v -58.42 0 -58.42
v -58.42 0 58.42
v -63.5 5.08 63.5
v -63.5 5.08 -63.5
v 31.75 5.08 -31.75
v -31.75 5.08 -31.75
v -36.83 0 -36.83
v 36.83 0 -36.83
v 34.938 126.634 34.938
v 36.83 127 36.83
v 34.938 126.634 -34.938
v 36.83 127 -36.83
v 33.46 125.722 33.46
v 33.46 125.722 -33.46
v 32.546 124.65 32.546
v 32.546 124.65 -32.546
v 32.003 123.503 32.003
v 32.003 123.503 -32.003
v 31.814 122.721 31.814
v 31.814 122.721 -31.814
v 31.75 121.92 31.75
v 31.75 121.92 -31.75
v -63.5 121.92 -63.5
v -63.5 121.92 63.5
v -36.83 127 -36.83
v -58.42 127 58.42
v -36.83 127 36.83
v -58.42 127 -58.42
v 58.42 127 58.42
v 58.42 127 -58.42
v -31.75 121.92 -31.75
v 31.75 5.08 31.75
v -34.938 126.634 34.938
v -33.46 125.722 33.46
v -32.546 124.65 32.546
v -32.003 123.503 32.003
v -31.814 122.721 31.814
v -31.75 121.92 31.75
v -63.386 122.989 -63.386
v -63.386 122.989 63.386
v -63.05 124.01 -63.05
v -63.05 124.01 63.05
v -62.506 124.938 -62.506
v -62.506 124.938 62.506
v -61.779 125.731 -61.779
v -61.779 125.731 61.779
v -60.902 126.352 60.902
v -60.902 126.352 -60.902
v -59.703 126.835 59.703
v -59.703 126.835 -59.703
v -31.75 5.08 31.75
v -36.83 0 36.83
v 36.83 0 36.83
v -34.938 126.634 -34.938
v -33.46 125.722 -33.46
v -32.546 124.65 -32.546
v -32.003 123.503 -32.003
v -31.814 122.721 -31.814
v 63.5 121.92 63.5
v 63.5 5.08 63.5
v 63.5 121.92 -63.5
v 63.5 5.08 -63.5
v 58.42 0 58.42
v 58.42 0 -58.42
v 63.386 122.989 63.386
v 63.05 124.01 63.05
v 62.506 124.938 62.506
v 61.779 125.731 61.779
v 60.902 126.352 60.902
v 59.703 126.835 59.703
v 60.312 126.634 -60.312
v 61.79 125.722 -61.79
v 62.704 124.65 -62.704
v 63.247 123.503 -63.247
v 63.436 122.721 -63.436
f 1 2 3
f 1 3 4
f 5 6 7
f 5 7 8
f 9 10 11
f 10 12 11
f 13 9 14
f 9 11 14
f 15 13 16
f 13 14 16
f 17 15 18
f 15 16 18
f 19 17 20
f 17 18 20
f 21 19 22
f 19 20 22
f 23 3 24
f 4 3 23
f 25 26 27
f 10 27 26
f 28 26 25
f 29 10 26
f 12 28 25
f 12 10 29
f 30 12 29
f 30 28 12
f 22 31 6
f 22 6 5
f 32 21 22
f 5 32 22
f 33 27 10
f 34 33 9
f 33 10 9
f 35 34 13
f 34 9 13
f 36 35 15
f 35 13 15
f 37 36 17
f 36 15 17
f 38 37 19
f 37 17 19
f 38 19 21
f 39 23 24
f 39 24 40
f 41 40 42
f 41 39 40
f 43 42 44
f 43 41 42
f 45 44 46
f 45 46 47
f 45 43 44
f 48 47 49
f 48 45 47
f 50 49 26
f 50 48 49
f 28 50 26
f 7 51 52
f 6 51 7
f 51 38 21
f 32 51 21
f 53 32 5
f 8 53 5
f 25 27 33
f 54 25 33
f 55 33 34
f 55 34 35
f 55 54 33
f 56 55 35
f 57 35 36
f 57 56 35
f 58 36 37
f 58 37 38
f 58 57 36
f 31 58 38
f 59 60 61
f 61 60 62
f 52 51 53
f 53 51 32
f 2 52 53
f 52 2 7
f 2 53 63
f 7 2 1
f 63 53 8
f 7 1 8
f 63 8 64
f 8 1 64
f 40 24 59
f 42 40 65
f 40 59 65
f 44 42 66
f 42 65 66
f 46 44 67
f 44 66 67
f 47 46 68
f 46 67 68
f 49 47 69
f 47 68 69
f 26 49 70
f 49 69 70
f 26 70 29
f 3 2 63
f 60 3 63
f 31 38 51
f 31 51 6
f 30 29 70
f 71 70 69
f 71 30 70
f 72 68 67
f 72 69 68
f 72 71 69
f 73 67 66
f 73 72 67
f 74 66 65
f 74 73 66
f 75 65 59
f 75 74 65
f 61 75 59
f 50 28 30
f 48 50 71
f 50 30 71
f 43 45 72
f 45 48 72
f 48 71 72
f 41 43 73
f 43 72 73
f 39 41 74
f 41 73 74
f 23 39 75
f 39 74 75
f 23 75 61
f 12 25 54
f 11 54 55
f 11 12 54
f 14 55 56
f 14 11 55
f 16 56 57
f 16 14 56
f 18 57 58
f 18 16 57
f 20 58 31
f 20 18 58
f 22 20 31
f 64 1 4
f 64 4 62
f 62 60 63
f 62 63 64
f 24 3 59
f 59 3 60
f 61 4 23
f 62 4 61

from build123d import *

# Parameters (mm, degrees)
SKETCH1_W           = 127
SKETCH1_H           = 127
BOSS_EXTRUDE1_DEPTH = 127
SKETCH2_W           = 63.5
SKETCH2_H           = 63.5
CUT_EXTRUDE1_DEPTH  = 128
CHAMFER1_SIZE       = 5.08
FILLET1_R           = 5.08


with BuildPart() as part:
    # Sketch1 → Boss-Extrude1 (new body)
    with BuildSketch(Plane(origin=(0, 0, 0), x_dir=(1, 0, 0), z_dir=(0, 1, 0))):
        Rectangle(SKETCH1_W, SKETCH1_H)
    extrude(amount=BOSS_EXTRUDE1_DEPTH)

    # Sketch2 → Cut-Extrude1 (cut, through all)
    with BuildSketch(Plane(origin=(0, 127, 0), x_dir=(1, 0, 0), z_dir=(0, 1, 0))):
        Rectangle(SKETCH2_W, SKETCH2_H)
    extrude(amount=-CUT_EXTRUDE1_DEPTH, mode=Mode.SUBTRACT)

    # Chamfer1
    chamfer1_edges = [part.edges().sort_by_distance(p)[0] for p in [
        (31.75, 0, 0),
        (0, 0, 31.75),
        (-31.75, 0, 0),
        (0, 0, -31.75),
        (0, 0, 63.5),
        (-63.5, 0, 0),
        (0, 0, -63.5),
        (63.5, 0, 0),
    ]]
    chamfer(chamfer1_edges, length=CHAMFER1_SIZE)

    # Fillet1
    fillet1_edges = [part.edges().sort_by_distance(p)[0] for p in [
        (-63.5, 127, 0),
        (0, 127, 63.5),
        (31.75, 127, 0),
        (0, 127, -31.75),
        (-31.75, 127, 0),
        (0, 127, 31.75),
        (63.5, 127, 0),
        (0, 127, -63.5),
    ]]
    fillet(fillet1_edges, radius=FILLET1_R)


solid = part.part
